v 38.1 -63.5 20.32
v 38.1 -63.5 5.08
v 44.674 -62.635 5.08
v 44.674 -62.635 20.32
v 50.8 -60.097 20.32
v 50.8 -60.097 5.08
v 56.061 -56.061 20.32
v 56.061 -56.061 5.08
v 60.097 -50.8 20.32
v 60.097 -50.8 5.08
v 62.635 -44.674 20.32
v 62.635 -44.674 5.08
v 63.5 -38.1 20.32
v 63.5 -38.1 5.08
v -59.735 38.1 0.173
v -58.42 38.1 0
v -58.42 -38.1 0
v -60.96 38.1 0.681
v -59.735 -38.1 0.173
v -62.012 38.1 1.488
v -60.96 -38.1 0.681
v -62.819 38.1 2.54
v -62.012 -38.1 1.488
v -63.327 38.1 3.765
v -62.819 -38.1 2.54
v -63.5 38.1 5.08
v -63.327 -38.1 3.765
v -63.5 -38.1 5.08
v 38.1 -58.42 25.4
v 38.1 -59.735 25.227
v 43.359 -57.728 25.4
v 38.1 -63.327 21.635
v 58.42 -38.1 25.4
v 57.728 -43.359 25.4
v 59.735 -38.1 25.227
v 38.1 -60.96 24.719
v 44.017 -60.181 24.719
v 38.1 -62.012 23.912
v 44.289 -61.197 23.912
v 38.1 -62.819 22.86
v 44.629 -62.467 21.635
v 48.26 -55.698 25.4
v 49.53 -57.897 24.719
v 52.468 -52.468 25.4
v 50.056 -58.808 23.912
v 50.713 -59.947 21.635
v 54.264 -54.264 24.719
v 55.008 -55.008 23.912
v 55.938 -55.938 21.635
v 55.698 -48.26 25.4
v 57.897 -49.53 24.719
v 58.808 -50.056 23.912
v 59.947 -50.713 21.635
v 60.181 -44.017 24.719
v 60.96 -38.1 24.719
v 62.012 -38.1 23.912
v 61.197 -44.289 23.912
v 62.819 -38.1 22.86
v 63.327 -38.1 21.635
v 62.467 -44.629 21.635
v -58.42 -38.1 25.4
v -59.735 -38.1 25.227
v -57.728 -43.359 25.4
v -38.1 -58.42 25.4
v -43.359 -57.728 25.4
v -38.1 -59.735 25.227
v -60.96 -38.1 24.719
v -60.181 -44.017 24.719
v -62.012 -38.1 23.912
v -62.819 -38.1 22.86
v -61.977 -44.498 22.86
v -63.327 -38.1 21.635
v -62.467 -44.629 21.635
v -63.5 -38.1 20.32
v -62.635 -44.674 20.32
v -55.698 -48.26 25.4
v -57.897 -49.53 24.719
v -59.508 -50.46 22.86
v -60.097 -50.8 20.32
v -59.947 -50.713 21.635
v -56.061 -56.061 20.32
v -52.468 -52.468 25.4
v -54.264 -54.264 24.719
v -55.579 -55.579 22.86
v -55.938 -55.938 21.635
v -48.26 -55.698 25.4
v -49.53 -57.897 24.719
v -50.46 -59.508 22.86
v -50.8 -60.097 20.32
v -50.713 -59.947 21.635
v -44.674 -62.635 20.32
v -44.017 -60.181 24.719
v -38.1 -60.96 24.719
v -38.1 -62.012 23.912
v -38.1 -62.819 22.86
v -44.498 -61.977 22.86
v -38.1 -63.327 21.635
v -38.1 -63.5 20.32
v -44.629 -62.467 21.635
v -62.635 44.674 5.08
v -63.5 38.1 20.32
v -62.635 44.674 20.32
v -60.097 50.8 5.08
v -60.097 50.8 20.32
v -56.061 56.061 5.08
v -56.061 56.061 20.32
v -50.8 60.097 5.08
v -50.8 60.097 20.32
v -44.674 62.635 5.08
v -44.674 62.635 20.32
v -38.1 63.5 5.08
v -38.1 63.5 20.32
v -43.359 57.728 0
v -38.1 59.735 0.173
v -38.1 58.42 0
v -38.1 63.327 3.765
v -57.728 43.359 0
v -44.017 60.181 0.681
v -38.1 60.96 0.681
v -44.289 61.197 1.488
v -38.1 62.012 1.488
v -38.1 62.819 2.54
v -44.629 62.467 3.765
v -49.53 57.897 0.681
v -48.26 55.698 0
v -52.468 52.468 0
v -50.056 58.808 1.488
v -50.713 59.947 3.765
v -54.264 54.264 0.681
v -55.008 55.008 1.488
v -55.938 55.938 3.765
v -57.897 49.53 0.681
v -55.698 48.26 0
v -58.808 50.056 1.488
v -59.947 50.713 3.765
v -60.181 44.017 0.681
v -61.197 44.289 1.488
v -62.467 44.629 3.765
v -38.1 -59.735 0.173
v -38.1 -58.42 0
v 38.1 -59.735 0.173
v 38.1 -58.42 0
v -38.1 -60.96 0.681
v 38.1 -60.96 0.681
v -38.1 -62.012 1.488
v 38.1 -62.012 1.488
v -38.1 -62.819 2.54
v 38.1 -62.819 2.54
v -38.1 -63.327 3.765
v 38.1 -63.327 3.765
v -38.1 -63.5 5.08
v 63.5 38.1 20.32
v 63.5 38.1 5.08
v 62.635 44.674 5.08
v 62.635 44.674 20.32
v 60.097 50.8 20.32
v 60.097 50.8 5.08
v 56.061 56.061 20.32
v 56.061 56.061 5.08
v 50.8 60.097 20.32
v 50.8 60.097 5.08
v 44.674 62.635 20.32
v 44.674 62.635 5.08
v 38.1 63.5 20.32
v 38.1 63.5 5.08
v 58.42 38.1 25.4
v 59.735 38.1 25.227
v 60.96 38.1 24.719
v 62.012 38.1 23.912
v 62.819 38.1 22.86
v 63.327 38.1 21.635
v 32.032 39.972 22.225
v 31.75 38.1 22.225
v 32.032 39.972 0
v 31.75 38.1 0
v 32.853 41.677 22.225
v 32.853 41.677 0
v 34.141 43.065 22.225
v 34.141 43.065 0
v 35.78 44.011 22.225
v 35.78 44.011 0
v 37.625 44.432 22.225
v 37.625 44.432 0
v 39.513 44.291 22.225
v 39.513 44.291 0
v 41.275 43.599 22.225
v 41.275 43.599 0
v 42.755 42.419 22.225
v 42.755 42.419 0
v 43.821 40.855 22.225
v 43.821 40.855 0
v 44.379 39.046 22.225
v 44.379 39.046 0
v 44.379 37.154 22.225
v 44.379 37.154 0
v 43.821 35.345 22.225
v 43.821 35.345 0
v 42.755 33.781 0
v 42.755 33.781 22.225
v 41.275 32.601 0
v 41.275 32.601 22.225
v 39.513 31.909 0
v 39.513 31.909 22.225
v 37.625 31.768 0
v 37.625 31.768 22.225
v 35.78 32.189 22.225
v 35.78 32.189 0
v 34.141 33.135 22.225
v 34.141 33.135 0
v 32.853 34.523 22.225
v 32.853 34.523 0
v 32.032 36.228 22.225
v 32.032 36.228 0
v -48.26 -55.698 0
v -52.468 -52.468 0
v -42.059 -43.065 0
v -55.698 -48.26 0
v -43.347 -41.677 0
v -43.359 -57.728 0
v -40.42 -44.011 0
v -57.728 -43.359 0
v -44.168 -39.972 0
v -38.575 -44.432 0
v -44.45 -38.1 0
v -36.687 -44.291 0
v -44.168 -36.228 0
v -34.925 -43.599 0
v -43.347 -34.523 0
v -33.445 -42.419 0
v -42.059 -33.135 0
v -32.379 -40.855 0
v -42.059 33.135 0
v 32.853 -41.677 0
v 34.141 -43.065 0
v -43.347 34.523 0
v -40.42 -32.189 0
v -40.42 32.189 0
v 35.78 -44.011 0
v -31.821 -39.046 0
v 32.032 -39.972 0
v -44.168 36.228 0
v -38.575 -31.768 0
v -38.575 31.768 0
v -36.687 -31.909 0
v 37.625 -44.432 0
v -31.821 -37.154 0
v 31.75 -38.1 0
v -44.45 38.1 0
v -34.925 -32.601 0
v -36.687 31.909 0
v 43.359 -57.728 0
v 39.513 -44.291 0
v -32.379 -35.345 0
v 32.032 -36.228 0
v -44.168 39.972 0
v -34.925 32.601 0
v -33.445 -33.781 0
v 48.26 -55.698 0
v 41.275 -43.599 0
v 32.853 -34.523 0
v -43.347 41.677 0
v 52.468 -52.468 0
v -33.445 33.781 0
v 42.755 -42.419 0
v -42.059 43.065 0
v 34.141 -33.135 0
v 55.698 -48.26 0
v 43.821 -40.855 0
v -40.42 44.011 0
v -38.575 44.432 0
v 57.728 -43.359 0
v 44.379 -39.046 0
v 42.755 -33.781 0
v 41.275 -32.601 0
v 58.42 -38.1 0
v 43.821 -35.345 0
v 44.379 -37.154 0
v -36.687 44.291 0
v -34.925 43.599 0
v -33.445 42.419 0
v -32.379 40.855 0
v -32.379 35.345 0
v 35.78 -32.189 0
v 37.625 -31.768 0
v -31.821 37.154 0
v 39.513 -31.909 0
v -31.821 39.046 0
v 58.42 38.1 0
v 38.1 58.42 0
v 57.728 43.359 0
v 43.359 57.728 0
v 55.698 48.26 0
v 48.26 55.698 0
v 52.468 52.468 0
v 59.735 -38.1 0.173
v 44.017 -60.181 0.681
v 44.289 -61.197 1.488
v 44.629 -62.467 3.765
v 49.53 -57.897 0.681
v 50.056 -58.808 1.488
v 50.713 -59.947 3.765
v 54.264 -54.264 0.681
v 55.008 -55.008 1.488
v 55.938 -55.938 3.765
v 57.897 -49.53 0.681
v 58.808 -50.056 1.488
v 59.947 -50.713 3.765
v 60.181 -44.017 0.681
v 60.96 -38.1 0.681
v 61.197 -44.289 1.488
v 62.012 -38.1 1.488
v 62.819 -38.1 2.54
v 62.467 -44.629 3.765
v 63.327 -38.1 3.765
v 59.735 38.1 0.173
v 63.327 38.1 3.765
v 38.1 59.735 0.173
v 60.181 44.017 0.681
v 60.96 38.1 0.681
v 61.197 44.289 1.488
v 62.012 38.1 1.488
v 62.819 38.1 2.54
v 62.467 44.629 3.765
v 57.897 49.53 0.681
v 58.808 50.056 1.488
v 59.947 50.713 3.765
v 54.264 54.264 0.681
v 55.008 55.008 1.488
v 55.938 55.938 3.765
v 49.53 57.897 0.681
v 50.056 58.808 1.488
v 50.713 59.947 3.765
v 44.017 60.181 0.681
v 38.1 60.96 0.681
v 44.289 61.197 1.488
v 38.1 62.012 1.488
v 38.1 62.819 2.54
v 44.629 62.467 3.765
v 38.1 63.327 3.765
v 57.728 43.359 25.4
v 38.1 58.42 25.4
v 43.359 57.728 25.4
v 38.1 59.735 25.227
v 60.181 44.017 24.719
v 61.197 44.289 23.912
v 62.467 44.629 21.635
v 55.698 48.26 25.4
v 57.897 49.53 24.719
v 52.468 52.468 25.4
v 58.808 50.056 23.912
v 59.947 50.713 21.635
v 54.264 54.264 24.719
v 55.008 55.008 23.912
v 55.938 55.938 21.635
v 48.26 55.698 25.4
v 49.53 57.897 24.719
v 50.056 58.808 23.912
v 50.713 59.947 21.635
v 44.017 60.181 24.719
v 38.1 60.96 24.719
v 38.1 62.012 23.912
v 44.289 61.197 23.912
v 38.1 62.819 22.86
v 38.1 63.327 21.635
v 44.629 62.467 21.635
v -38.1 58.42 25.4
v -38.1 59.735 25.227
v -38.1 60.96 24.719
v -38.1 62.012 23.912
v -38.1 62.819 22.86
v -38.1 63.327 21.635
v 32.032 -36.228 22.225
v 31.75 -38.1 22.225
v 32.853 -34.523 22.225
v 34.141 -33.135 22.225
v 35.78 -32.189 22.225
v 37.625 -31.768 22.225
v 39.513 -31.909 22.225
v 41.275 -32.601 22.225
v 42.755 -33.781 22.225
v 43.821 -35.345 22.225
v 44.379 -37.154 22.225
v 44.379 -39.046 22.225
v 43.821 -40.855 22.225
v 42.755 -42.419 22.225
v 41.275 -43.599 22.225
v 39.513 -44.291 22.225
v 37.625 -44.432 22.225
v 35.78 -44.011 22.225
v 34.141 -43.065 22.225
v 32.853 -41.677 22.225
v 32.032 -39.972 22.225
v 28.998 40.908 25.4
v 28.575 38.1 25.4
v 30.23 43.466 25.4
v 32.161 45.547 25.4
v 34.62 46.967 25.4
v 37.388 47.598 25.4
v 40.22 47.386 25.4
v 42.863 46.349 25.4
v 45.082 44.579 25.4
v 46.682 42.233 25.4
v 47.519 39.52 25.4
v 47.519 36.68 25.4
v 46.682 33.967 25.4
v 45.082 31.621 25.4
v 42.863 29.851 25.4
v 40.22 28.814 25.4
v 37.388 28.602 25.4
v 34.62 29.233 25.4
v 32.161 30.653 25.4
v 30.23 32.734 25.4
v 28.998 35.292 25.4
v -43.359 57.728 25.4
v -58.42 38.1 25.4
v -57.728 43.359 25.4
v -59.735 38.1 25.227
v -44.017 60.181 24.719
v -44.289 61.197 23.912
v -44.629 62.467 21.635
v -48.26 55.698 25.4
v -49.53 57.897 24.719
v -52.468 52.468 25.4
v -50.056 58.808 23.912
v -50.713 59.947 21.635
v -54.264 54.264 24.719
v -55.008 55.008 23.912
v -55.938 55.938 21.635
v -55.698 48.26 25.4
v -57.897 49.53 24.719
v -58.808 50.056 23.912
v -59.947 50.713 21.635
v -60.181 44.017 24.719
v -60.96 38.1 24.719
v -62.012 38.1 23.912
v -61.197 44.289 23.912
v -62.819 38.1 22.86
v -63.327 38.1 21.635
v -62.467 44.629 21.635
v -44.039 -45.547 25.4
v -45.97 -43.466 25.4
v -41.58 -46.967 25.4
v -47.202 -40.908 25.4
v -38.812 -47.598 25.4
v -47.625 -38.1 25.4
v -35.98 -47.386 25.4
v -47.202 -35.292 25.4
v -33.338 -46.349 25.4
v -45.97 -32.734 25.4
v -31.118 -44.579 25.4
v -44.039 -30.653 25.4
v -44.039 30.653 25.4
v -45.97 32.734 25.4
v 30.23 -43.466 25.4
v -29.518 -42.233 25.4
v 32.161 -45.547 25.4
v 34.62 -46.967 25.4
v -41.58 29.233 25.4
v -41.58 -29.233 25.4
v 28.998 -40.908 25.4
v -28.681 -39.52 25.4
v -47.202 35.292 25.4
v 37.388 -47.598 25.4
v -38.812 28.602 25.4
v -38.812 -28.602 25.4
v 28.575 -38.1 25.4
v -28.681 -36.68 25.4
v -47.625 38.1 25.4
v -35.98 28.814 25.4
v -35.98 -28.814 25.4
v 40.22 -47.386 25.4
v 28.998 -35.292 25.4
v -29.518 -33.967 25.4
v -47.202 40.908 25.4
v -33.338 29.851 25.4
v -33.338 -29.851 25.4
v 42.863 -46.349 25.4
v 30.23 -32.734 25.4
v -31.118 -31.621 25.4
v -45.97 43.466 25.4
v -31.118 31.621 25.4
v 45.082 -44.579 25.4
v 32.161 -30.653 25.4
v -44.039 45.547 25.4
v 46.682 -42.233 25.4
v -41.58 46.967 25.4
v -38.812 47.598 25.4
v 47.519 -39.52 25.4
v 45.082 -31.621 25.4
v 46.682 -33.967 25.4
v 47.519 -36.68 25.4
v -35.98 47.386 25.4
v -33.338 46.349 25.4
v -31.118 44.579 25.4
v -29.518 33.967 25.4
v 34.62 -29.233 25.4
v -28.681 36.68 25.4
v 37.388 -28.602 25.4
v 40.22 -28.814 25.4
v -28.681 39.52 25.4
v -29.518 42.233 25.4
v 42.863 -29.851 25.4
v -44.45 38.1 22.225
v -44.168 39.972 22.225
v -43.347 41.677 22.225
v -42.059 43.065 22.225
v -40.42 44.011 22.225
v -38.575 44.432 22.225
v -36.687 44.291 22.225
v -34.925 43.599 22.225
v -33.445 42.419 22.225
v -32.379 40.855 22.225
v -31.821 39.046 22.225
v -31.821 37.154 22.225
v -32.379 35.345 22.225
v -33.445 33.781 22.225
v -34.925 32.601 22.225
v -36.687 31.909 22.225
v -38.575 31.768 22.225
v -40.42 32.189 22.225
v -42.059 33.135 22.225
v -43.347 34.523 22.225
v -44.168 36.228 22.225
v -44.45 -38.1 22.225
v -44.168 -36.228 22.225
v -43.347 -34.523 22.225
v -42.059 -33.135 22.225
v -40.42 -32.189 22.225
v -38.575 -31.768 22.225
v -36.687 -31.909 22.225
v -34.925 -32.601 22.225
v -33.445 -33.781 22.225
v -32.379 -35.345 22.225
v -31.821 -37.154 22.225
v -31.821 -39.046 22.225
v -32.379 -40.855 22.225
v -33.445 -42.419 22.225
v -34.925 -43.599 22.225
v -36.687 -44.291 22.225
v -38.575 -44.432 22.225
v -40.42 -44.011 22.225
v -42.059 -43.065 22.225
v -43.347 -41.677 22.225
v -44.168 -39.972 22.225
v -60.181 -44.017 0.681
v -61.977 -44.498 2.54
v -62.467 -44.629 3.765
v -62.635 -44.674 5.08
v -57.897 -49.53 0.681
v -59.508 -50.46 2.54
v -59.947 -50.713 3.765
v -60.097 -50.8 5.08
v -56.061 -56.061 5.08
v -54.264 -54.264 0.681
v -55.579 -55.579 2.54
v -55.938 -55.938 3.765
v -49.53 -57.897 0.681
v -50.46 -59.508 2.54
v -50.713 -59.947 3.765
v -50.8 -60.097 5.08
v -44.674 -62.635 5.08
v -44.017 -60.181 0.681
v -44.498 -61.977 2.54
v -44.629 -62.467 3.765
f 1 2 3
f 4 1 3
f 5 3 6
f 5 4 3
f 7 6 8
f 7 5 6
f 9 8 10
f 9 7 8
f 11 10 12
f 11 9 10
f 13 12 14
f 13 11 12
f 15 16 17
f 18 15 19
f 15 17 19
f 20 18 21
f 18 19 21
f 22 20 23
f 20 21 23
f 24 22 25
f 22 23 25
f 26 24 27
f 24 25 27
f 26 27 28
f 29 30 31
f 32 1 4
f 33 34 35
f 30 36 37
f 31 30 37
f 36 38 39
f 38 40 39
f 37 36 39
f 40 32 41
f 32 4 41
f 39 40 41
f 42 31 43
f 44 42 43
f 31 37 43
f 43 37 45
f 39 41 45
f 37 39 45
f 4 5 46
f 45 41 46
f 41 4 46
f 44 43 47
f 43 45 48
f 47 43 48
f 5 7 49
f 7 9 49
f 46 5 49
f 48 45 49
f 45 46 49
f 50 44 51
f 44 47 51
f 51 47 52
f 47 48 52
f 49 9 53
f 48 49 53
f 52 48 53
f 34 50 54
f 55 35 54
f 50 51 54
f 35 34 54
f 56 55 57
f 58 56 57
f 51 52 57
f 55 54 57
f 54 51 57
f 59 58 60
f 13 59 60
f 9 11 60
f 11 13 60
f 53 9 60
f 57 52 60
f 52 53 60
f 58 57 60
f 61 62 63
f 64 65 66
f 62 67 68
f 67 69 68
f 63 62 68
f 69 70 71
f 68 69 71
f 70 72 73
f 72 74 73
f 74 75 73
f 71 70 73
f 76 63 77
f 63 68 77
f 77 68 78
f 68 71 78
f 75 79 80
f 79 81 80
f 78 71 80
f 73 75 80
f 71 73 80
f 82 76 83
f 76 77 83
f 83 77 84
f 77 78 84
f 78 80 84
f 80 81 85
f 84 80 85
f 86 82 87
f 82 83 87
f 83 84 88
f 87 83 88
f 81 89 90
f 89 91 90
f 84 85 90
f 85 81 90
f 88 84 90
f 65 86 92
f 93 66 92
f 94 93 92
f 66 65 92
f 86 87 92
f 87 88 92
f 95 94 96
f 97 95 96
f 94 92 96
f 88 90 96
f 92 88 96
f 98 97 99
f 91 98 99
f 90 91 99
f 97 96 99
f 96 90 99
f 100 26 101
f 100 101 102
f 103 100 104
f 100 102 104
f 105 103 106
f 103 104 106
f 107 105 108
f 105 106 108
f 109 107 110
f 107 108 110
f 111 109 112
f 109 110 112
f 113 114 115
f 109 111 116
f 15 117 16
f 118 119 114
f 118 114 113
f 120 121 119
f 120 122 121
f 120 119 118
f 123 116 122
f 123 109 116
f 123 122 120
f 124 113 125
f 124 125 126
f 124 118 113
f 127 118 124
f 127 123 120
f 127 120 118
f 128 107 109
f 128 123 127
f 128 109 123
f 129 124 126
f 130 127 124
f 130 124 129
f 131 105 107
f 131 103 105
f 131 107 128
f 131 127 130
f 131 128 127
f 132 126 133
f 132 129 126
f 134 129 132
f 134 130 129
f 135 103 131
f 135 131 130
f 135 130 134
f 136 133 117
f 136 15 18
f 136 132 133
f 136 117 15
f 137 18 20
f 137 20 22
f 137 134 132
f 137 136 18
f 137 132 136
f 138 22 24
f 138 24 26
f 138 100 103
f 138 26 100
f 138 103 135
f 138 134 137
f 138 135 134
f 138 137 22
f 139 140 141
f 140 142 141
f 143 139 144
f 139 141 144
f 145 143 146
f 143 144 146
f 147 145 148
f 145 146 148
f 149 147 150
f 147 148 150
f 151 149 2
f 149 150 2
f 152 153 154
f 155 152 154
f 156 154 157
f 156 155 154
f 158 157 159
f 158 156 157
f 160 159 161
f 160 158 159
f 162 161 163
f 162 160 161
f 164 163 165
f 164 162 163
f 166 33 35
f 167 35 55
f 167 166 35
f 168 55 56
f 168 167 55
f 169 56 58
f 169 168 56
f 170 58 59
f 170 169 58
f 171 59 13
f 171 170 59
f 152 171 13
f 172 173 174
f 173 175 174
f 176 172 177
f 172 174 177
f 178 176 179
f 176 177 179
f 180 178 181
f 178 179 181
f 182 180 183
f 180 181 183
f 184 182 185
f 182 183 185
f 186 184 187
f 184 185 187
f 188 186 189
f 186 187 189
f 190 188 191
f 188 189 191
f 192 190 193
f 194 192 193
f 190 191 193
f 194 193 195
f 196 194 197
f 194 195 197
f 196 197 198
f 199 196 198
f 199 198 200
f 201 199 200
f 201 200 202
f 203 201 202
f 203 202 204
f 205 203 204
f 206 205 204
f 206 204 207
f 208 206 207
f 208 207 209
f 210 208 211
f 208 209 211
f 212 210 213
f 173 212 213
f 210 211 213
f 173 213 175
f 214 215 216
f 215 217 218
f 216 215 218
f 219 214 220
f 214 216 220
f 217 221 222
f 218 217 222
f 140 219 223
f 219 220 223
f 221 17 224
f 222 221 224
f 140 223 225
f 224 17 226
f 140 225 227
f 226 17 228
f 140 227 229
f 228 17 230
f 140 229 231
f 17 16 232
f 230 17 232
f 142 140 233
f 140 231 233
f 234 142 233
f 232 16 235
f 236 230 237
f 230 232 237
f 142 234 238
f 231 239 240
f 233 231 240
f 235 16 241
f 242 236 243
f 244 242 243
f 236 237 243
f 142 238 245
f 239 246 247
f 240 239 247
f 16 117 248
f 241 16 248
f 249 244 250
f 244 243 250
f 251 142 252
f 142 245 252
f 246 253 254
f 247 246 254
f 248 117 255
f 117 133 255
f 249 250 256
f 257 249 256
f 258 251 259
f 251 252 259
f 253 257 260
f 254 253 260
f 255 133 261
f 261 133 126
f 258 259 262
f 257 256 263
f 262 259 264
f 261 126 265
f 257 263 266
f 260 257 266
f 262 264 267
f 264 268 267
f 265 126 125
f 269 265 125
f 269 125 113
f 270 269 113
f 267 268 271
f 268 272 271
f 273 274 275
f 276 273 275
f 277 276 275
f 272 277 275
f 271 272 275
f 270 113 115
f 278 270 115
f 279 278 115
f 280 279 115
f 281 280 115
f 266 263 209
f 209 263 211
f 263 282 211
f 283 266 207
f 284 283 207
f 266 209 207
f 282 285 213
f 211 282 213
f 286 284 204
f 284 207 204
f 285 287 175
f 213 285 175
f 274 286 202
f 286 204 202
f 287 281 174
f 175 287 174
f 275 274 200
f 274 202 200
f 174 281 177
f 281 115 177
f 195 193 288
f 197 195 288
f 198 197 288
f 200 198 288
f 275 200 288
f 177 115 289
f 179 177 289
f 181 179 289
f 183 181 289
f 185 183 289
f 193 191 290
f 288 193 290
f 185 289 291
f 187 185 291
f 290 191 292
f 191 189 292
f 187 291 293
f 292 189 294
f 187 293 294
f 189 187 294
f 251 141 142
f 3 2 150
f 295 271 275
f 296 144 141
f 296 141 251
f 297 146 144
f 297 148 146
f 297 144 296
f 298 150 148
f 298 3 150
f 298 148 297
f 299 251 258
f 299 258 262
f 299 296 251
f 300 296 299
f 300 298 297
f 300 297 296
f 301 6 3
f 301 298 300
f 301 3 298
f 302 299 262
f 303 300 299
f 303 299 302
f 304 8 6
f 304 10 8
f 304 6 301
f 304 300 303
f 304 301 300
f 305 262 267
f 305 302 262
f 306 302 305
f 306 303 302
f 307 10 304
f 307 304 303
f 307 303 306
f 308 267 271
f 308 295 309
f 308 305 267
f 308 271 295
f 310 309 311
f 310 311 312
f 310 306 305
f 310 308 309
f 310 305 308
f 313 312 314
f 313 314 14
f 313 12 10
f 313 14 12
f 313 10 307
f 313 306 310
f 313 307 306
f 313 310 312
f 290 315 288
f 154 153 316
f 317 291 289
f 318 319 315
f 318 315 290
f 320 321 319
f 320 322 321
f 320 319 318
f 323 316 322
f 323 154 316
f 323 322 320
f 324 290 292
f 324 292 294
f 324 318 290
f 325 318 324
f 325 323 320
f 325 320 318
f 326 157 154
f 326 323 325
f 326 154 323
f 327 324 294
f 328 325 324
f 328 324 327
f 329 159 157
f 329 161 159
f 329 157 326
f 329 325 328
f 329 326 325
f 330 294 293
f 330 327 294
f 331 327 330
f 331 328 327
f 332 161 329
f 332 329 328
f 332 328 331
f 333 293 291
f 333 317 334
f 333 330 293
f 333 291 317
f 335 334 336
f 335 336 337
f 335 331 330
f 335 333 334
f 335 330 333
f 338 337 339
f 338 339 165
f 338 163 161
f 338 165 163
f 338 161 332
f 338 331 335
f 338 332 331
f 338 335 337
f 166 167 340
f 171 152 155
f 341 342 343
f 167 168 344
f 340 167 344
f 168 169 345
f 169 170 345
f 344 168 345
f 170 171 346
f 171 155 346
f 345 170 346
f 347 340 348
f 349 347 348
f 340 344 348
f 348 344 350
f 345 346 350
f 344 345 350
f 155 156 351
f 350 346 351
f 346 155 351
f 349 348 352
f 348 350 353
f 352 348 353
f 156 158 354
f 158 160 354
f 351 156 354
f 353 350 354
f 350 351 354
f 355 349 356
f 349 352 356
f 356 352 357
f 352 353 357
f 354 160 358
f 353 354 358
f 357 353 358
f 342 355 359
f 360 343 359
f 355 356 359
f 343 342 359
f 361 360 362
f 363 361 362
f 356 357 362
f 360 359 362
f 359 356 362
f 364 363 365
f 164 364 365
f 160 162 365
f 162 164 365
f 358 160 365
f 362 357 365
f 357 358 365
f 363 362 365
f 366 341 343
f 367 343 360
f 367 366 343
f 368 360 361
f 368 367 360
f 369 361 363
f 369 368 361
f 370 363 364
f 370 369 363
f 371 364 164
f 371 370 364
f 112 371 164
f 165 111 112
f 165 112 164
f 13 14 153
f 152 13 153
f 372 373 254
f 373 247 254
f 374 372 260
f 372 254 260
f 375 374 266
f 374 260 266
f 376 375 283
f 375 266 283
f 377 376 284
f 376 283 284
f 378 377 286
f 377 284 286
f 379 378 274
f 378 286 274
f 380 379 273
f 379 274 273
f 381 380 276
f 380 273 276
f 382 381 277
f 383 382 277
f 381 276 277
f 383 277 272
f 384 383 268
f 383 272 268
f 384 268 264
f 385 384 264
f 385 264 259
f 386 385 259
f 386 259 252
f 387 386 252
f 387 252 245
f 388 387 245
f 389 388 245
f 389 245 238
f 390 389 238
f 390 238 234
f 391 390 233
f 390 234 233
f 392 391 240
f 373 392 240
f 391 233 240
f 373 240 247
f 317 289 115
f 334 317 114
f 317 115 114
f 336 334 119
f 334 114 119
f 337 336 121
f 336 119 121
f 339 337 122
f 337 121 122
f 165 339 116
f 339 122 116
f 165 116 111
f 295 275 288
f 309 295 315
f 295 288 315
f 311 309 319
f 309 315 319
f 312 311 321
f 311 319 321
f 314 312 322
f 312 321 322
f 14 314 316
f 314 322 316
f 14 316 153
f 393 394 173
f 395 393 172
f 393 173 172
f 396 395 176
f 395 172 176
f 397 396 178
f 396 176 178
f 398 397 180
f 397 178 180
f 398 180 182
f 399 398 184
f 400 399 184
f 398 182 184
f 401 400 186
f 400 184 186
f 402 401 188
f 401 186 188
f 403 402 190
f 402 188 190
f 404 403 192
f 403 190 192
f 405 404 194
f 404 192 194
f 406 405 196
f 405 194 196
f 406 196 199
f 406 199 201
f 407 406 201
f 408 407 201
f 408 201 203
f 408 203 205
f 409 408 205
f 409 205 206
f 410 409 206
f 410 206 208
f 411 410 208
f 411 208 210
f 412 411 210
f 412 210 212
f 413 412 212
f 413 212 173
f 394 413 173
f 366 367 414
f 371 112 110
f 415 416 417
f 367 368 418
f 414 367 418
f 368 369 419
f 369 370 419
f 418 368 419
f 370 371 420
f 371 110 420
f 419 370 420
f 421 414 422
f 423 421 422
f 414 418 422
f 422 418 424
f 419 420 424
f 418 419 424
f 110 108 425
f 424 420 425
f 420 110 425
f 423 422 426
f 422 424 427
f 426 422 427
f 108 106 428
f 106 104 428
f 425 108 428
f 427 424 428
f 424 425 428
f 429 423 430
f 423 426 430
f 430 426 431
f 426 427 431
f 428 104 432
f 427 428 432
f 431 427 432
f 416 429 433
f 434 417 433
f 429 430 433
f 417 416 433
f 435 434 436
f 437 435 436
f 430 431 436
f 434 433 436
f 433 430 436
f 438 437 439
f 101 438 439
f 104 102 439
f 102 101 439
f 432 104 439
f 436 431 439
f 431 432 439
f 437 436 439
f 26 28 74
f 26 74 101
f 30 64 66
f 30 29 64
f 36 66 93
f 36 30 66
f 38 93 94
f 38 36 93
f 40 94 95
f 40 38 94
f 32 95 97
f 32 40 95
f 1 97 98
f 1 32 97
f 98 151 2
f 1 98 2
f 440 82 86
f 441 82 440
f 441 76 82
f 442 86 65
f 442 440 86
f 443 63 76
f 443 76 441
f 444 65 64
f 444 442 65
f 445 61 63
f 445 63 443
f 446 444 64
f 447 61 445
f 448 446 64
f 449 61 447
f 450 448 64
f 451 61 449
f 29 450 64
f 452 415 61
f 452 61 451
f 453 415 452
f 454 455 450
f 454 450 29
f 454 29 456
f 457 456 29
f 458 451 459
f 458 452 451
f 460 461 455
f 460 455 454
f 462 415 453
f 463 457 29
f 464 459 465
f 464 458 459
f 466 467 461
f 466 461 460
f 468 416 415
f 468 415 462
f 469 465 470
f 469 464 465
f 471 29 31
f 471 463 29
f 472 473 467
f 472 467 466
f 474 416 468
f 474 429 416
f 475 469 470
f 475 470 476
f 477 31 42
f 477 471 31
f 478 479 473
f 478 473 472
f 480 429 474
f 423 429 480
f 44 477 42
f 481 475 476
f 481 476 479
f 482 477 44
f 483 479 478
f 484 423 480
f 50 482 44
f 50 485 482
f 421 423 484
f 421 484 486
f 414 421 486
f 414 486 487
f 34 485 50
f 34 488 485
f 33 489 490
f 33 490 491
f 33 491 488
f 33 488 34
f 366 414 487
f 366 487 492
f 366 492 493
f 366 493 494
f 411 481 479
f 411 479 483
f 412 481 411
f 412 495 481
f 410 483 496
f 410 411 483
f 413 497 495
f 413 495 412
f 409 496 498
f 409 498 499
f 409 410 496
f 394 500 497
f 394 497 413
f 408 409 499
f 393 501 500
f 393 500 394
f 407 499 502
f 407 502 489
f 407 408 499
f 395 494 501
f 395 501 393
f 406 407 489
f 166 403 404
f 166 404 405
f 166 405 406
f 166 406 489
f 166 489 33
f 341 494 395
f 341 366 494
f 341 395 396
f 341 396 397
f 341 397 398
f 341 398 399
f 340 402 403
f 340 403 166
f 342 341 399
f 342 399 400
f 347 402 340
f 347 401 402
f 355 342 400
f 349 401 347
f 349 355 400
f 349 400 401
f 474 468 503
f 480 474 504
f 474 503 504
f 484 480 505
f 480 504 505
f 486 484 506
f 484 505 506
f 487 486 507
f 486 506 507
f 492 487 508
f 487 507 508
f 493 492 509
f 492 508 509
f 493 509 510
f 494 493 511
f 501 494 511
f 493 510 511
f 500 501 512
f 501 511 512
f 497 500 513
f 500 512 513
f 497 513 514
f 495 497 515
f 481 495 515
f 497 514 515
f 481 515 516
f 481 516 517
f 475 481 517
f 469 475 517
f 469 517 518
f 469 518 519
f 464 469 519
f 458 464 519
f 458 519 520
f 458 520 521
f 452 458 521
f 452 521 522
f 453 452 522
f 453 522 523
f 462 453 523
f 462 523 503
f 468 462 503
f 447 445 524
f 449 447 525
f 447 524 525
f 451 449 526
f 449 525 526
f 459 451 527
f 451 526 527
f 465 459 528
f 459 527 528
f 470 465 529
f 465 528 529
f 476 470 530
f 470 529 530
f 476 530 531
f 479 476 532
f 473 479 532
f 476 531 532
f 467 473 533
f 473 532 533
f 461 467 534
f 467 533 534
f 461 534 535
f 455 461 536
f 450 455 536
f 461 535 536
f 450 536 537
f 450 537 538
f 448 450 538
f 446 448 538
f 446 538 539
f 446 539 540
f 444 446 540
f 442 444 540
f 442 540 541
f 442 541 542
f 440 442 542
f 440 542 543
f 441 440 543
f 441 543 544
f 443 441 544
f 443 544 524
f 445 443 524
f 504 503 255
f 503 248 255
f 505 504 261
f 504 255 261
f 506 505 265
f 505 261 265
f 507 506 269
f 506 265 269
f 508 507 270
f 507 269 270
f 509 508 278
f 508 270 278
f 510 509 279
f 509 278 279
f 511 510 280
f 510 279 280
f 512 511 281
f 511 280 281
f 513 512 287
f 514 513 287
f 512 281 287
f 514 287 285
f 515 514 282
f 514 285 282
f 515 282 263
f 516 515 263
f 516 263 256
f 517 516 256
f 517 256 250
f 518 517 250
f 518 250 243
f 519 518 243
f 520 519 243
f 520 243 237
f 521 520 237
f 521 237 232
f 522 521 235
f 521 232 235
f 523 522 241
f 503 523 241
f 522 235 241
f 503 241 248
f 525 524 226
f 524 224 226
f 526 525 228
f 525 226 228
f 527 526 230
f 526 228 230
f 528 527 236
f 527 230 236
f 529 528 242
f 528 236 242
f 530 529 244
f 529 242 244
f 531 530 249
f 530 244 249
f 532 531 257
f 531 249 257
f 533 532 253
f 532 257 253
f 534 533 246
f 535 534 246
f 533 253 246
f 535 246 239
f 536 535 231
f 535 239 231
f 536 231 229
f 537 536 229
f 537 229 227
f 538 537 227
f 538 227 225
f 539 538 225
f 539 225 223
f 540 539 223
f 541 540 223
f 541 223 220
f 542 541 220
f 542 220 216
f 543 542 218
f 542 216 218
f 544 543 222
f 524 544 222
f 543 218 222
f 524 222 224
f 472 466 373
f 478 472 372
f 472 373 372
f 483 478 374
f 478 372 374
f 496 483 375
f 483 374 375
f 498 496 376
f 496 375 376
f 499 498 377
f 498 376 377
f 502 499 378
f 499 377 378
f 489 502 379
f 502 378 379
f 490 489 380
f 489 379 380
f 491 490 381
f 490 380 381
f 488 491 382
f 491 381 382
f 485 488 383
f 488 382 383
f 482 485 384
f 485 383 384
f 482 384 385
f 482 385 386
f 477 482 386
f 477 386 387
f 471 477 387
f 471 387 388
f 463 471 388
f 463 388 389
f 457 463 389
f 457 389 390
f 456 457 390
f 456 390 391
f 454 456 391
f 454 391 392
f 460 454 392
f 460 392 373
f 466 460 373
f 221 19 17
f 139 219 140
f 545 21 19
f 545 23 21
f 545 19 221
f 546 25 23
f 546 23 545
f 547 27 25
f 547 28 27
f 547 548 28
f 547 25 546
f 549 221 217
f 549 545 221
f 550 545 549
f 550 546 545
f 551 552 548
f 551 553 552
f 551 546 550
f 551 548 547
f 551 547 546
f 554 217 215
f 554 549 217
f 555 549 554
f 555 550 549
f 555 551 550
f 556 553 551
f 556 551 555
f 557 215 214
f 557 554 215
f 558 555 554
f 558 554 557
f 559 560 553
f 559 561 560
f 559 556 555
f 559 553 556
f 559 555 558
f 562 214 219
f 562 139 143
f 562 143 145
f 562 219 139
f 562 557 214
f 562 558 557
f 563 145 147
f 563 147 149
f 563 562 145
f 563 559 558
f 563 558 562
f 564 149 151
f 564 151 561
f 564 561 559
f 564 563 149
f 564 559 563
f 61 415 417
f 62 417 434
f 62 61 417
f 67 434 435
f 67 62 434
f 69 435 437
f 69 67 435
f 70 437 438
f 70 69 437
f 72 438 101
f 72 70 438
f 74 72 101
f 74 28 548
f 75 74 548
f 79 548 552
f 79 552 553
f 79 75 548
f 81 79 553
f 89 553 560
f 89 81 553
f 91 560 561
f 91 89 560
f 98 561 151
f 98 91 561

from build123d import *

# Parameters (mm, degrees)
F0_W           = 127
F0_H           = 127
F1_DEPTH       = 25.4
F2_R           = 25.4
F3_R           = 5.08
F5_D           = 12.7
F5_CSINK_D     = 19.05
F5_CSINK_ANGLE = 90


with BuildPart() as f1:
    # F0 (on Top) → F1 (new body)
    with BuildSketch(Plane.XY):
        Rectangle(F0_W, F0_H)
    extrude(amount=F1_DEPTH)

    # F2
    f2_edges = [f1.edges().sort_by_distance(p)[0] for p in [
        (63.5, -63.5, 12.7),
        (63.5, 63.5, 12.7),
        (-63.5, -63.5, 12.7),
        (-63.5, 63.5, 12.7),
    ]]
    fillet(f2_edges, radius=F2_R)

    # F3
    f3_edges = [f1.edges().sort_by_distance(p)[0] for p in [
        (0, -63.5, 25.4),
        (0, -63.5, 0),
    ]]
    fillet(f3_edges, radius=F3_R)

    # F5 (through all)
    with Locations(Plane.XY.offset(25.4)):
        with Locations((-38.1, -38.1), (-38.1, 38.1), (38.1, -38.1), (38.1, 38.1)):
            CounterSinkHole(F5_D / 2, F5_CSINK_D / 2, counter_sink_angle=F5_CSINK_ANGLE)


solid = f1.part
